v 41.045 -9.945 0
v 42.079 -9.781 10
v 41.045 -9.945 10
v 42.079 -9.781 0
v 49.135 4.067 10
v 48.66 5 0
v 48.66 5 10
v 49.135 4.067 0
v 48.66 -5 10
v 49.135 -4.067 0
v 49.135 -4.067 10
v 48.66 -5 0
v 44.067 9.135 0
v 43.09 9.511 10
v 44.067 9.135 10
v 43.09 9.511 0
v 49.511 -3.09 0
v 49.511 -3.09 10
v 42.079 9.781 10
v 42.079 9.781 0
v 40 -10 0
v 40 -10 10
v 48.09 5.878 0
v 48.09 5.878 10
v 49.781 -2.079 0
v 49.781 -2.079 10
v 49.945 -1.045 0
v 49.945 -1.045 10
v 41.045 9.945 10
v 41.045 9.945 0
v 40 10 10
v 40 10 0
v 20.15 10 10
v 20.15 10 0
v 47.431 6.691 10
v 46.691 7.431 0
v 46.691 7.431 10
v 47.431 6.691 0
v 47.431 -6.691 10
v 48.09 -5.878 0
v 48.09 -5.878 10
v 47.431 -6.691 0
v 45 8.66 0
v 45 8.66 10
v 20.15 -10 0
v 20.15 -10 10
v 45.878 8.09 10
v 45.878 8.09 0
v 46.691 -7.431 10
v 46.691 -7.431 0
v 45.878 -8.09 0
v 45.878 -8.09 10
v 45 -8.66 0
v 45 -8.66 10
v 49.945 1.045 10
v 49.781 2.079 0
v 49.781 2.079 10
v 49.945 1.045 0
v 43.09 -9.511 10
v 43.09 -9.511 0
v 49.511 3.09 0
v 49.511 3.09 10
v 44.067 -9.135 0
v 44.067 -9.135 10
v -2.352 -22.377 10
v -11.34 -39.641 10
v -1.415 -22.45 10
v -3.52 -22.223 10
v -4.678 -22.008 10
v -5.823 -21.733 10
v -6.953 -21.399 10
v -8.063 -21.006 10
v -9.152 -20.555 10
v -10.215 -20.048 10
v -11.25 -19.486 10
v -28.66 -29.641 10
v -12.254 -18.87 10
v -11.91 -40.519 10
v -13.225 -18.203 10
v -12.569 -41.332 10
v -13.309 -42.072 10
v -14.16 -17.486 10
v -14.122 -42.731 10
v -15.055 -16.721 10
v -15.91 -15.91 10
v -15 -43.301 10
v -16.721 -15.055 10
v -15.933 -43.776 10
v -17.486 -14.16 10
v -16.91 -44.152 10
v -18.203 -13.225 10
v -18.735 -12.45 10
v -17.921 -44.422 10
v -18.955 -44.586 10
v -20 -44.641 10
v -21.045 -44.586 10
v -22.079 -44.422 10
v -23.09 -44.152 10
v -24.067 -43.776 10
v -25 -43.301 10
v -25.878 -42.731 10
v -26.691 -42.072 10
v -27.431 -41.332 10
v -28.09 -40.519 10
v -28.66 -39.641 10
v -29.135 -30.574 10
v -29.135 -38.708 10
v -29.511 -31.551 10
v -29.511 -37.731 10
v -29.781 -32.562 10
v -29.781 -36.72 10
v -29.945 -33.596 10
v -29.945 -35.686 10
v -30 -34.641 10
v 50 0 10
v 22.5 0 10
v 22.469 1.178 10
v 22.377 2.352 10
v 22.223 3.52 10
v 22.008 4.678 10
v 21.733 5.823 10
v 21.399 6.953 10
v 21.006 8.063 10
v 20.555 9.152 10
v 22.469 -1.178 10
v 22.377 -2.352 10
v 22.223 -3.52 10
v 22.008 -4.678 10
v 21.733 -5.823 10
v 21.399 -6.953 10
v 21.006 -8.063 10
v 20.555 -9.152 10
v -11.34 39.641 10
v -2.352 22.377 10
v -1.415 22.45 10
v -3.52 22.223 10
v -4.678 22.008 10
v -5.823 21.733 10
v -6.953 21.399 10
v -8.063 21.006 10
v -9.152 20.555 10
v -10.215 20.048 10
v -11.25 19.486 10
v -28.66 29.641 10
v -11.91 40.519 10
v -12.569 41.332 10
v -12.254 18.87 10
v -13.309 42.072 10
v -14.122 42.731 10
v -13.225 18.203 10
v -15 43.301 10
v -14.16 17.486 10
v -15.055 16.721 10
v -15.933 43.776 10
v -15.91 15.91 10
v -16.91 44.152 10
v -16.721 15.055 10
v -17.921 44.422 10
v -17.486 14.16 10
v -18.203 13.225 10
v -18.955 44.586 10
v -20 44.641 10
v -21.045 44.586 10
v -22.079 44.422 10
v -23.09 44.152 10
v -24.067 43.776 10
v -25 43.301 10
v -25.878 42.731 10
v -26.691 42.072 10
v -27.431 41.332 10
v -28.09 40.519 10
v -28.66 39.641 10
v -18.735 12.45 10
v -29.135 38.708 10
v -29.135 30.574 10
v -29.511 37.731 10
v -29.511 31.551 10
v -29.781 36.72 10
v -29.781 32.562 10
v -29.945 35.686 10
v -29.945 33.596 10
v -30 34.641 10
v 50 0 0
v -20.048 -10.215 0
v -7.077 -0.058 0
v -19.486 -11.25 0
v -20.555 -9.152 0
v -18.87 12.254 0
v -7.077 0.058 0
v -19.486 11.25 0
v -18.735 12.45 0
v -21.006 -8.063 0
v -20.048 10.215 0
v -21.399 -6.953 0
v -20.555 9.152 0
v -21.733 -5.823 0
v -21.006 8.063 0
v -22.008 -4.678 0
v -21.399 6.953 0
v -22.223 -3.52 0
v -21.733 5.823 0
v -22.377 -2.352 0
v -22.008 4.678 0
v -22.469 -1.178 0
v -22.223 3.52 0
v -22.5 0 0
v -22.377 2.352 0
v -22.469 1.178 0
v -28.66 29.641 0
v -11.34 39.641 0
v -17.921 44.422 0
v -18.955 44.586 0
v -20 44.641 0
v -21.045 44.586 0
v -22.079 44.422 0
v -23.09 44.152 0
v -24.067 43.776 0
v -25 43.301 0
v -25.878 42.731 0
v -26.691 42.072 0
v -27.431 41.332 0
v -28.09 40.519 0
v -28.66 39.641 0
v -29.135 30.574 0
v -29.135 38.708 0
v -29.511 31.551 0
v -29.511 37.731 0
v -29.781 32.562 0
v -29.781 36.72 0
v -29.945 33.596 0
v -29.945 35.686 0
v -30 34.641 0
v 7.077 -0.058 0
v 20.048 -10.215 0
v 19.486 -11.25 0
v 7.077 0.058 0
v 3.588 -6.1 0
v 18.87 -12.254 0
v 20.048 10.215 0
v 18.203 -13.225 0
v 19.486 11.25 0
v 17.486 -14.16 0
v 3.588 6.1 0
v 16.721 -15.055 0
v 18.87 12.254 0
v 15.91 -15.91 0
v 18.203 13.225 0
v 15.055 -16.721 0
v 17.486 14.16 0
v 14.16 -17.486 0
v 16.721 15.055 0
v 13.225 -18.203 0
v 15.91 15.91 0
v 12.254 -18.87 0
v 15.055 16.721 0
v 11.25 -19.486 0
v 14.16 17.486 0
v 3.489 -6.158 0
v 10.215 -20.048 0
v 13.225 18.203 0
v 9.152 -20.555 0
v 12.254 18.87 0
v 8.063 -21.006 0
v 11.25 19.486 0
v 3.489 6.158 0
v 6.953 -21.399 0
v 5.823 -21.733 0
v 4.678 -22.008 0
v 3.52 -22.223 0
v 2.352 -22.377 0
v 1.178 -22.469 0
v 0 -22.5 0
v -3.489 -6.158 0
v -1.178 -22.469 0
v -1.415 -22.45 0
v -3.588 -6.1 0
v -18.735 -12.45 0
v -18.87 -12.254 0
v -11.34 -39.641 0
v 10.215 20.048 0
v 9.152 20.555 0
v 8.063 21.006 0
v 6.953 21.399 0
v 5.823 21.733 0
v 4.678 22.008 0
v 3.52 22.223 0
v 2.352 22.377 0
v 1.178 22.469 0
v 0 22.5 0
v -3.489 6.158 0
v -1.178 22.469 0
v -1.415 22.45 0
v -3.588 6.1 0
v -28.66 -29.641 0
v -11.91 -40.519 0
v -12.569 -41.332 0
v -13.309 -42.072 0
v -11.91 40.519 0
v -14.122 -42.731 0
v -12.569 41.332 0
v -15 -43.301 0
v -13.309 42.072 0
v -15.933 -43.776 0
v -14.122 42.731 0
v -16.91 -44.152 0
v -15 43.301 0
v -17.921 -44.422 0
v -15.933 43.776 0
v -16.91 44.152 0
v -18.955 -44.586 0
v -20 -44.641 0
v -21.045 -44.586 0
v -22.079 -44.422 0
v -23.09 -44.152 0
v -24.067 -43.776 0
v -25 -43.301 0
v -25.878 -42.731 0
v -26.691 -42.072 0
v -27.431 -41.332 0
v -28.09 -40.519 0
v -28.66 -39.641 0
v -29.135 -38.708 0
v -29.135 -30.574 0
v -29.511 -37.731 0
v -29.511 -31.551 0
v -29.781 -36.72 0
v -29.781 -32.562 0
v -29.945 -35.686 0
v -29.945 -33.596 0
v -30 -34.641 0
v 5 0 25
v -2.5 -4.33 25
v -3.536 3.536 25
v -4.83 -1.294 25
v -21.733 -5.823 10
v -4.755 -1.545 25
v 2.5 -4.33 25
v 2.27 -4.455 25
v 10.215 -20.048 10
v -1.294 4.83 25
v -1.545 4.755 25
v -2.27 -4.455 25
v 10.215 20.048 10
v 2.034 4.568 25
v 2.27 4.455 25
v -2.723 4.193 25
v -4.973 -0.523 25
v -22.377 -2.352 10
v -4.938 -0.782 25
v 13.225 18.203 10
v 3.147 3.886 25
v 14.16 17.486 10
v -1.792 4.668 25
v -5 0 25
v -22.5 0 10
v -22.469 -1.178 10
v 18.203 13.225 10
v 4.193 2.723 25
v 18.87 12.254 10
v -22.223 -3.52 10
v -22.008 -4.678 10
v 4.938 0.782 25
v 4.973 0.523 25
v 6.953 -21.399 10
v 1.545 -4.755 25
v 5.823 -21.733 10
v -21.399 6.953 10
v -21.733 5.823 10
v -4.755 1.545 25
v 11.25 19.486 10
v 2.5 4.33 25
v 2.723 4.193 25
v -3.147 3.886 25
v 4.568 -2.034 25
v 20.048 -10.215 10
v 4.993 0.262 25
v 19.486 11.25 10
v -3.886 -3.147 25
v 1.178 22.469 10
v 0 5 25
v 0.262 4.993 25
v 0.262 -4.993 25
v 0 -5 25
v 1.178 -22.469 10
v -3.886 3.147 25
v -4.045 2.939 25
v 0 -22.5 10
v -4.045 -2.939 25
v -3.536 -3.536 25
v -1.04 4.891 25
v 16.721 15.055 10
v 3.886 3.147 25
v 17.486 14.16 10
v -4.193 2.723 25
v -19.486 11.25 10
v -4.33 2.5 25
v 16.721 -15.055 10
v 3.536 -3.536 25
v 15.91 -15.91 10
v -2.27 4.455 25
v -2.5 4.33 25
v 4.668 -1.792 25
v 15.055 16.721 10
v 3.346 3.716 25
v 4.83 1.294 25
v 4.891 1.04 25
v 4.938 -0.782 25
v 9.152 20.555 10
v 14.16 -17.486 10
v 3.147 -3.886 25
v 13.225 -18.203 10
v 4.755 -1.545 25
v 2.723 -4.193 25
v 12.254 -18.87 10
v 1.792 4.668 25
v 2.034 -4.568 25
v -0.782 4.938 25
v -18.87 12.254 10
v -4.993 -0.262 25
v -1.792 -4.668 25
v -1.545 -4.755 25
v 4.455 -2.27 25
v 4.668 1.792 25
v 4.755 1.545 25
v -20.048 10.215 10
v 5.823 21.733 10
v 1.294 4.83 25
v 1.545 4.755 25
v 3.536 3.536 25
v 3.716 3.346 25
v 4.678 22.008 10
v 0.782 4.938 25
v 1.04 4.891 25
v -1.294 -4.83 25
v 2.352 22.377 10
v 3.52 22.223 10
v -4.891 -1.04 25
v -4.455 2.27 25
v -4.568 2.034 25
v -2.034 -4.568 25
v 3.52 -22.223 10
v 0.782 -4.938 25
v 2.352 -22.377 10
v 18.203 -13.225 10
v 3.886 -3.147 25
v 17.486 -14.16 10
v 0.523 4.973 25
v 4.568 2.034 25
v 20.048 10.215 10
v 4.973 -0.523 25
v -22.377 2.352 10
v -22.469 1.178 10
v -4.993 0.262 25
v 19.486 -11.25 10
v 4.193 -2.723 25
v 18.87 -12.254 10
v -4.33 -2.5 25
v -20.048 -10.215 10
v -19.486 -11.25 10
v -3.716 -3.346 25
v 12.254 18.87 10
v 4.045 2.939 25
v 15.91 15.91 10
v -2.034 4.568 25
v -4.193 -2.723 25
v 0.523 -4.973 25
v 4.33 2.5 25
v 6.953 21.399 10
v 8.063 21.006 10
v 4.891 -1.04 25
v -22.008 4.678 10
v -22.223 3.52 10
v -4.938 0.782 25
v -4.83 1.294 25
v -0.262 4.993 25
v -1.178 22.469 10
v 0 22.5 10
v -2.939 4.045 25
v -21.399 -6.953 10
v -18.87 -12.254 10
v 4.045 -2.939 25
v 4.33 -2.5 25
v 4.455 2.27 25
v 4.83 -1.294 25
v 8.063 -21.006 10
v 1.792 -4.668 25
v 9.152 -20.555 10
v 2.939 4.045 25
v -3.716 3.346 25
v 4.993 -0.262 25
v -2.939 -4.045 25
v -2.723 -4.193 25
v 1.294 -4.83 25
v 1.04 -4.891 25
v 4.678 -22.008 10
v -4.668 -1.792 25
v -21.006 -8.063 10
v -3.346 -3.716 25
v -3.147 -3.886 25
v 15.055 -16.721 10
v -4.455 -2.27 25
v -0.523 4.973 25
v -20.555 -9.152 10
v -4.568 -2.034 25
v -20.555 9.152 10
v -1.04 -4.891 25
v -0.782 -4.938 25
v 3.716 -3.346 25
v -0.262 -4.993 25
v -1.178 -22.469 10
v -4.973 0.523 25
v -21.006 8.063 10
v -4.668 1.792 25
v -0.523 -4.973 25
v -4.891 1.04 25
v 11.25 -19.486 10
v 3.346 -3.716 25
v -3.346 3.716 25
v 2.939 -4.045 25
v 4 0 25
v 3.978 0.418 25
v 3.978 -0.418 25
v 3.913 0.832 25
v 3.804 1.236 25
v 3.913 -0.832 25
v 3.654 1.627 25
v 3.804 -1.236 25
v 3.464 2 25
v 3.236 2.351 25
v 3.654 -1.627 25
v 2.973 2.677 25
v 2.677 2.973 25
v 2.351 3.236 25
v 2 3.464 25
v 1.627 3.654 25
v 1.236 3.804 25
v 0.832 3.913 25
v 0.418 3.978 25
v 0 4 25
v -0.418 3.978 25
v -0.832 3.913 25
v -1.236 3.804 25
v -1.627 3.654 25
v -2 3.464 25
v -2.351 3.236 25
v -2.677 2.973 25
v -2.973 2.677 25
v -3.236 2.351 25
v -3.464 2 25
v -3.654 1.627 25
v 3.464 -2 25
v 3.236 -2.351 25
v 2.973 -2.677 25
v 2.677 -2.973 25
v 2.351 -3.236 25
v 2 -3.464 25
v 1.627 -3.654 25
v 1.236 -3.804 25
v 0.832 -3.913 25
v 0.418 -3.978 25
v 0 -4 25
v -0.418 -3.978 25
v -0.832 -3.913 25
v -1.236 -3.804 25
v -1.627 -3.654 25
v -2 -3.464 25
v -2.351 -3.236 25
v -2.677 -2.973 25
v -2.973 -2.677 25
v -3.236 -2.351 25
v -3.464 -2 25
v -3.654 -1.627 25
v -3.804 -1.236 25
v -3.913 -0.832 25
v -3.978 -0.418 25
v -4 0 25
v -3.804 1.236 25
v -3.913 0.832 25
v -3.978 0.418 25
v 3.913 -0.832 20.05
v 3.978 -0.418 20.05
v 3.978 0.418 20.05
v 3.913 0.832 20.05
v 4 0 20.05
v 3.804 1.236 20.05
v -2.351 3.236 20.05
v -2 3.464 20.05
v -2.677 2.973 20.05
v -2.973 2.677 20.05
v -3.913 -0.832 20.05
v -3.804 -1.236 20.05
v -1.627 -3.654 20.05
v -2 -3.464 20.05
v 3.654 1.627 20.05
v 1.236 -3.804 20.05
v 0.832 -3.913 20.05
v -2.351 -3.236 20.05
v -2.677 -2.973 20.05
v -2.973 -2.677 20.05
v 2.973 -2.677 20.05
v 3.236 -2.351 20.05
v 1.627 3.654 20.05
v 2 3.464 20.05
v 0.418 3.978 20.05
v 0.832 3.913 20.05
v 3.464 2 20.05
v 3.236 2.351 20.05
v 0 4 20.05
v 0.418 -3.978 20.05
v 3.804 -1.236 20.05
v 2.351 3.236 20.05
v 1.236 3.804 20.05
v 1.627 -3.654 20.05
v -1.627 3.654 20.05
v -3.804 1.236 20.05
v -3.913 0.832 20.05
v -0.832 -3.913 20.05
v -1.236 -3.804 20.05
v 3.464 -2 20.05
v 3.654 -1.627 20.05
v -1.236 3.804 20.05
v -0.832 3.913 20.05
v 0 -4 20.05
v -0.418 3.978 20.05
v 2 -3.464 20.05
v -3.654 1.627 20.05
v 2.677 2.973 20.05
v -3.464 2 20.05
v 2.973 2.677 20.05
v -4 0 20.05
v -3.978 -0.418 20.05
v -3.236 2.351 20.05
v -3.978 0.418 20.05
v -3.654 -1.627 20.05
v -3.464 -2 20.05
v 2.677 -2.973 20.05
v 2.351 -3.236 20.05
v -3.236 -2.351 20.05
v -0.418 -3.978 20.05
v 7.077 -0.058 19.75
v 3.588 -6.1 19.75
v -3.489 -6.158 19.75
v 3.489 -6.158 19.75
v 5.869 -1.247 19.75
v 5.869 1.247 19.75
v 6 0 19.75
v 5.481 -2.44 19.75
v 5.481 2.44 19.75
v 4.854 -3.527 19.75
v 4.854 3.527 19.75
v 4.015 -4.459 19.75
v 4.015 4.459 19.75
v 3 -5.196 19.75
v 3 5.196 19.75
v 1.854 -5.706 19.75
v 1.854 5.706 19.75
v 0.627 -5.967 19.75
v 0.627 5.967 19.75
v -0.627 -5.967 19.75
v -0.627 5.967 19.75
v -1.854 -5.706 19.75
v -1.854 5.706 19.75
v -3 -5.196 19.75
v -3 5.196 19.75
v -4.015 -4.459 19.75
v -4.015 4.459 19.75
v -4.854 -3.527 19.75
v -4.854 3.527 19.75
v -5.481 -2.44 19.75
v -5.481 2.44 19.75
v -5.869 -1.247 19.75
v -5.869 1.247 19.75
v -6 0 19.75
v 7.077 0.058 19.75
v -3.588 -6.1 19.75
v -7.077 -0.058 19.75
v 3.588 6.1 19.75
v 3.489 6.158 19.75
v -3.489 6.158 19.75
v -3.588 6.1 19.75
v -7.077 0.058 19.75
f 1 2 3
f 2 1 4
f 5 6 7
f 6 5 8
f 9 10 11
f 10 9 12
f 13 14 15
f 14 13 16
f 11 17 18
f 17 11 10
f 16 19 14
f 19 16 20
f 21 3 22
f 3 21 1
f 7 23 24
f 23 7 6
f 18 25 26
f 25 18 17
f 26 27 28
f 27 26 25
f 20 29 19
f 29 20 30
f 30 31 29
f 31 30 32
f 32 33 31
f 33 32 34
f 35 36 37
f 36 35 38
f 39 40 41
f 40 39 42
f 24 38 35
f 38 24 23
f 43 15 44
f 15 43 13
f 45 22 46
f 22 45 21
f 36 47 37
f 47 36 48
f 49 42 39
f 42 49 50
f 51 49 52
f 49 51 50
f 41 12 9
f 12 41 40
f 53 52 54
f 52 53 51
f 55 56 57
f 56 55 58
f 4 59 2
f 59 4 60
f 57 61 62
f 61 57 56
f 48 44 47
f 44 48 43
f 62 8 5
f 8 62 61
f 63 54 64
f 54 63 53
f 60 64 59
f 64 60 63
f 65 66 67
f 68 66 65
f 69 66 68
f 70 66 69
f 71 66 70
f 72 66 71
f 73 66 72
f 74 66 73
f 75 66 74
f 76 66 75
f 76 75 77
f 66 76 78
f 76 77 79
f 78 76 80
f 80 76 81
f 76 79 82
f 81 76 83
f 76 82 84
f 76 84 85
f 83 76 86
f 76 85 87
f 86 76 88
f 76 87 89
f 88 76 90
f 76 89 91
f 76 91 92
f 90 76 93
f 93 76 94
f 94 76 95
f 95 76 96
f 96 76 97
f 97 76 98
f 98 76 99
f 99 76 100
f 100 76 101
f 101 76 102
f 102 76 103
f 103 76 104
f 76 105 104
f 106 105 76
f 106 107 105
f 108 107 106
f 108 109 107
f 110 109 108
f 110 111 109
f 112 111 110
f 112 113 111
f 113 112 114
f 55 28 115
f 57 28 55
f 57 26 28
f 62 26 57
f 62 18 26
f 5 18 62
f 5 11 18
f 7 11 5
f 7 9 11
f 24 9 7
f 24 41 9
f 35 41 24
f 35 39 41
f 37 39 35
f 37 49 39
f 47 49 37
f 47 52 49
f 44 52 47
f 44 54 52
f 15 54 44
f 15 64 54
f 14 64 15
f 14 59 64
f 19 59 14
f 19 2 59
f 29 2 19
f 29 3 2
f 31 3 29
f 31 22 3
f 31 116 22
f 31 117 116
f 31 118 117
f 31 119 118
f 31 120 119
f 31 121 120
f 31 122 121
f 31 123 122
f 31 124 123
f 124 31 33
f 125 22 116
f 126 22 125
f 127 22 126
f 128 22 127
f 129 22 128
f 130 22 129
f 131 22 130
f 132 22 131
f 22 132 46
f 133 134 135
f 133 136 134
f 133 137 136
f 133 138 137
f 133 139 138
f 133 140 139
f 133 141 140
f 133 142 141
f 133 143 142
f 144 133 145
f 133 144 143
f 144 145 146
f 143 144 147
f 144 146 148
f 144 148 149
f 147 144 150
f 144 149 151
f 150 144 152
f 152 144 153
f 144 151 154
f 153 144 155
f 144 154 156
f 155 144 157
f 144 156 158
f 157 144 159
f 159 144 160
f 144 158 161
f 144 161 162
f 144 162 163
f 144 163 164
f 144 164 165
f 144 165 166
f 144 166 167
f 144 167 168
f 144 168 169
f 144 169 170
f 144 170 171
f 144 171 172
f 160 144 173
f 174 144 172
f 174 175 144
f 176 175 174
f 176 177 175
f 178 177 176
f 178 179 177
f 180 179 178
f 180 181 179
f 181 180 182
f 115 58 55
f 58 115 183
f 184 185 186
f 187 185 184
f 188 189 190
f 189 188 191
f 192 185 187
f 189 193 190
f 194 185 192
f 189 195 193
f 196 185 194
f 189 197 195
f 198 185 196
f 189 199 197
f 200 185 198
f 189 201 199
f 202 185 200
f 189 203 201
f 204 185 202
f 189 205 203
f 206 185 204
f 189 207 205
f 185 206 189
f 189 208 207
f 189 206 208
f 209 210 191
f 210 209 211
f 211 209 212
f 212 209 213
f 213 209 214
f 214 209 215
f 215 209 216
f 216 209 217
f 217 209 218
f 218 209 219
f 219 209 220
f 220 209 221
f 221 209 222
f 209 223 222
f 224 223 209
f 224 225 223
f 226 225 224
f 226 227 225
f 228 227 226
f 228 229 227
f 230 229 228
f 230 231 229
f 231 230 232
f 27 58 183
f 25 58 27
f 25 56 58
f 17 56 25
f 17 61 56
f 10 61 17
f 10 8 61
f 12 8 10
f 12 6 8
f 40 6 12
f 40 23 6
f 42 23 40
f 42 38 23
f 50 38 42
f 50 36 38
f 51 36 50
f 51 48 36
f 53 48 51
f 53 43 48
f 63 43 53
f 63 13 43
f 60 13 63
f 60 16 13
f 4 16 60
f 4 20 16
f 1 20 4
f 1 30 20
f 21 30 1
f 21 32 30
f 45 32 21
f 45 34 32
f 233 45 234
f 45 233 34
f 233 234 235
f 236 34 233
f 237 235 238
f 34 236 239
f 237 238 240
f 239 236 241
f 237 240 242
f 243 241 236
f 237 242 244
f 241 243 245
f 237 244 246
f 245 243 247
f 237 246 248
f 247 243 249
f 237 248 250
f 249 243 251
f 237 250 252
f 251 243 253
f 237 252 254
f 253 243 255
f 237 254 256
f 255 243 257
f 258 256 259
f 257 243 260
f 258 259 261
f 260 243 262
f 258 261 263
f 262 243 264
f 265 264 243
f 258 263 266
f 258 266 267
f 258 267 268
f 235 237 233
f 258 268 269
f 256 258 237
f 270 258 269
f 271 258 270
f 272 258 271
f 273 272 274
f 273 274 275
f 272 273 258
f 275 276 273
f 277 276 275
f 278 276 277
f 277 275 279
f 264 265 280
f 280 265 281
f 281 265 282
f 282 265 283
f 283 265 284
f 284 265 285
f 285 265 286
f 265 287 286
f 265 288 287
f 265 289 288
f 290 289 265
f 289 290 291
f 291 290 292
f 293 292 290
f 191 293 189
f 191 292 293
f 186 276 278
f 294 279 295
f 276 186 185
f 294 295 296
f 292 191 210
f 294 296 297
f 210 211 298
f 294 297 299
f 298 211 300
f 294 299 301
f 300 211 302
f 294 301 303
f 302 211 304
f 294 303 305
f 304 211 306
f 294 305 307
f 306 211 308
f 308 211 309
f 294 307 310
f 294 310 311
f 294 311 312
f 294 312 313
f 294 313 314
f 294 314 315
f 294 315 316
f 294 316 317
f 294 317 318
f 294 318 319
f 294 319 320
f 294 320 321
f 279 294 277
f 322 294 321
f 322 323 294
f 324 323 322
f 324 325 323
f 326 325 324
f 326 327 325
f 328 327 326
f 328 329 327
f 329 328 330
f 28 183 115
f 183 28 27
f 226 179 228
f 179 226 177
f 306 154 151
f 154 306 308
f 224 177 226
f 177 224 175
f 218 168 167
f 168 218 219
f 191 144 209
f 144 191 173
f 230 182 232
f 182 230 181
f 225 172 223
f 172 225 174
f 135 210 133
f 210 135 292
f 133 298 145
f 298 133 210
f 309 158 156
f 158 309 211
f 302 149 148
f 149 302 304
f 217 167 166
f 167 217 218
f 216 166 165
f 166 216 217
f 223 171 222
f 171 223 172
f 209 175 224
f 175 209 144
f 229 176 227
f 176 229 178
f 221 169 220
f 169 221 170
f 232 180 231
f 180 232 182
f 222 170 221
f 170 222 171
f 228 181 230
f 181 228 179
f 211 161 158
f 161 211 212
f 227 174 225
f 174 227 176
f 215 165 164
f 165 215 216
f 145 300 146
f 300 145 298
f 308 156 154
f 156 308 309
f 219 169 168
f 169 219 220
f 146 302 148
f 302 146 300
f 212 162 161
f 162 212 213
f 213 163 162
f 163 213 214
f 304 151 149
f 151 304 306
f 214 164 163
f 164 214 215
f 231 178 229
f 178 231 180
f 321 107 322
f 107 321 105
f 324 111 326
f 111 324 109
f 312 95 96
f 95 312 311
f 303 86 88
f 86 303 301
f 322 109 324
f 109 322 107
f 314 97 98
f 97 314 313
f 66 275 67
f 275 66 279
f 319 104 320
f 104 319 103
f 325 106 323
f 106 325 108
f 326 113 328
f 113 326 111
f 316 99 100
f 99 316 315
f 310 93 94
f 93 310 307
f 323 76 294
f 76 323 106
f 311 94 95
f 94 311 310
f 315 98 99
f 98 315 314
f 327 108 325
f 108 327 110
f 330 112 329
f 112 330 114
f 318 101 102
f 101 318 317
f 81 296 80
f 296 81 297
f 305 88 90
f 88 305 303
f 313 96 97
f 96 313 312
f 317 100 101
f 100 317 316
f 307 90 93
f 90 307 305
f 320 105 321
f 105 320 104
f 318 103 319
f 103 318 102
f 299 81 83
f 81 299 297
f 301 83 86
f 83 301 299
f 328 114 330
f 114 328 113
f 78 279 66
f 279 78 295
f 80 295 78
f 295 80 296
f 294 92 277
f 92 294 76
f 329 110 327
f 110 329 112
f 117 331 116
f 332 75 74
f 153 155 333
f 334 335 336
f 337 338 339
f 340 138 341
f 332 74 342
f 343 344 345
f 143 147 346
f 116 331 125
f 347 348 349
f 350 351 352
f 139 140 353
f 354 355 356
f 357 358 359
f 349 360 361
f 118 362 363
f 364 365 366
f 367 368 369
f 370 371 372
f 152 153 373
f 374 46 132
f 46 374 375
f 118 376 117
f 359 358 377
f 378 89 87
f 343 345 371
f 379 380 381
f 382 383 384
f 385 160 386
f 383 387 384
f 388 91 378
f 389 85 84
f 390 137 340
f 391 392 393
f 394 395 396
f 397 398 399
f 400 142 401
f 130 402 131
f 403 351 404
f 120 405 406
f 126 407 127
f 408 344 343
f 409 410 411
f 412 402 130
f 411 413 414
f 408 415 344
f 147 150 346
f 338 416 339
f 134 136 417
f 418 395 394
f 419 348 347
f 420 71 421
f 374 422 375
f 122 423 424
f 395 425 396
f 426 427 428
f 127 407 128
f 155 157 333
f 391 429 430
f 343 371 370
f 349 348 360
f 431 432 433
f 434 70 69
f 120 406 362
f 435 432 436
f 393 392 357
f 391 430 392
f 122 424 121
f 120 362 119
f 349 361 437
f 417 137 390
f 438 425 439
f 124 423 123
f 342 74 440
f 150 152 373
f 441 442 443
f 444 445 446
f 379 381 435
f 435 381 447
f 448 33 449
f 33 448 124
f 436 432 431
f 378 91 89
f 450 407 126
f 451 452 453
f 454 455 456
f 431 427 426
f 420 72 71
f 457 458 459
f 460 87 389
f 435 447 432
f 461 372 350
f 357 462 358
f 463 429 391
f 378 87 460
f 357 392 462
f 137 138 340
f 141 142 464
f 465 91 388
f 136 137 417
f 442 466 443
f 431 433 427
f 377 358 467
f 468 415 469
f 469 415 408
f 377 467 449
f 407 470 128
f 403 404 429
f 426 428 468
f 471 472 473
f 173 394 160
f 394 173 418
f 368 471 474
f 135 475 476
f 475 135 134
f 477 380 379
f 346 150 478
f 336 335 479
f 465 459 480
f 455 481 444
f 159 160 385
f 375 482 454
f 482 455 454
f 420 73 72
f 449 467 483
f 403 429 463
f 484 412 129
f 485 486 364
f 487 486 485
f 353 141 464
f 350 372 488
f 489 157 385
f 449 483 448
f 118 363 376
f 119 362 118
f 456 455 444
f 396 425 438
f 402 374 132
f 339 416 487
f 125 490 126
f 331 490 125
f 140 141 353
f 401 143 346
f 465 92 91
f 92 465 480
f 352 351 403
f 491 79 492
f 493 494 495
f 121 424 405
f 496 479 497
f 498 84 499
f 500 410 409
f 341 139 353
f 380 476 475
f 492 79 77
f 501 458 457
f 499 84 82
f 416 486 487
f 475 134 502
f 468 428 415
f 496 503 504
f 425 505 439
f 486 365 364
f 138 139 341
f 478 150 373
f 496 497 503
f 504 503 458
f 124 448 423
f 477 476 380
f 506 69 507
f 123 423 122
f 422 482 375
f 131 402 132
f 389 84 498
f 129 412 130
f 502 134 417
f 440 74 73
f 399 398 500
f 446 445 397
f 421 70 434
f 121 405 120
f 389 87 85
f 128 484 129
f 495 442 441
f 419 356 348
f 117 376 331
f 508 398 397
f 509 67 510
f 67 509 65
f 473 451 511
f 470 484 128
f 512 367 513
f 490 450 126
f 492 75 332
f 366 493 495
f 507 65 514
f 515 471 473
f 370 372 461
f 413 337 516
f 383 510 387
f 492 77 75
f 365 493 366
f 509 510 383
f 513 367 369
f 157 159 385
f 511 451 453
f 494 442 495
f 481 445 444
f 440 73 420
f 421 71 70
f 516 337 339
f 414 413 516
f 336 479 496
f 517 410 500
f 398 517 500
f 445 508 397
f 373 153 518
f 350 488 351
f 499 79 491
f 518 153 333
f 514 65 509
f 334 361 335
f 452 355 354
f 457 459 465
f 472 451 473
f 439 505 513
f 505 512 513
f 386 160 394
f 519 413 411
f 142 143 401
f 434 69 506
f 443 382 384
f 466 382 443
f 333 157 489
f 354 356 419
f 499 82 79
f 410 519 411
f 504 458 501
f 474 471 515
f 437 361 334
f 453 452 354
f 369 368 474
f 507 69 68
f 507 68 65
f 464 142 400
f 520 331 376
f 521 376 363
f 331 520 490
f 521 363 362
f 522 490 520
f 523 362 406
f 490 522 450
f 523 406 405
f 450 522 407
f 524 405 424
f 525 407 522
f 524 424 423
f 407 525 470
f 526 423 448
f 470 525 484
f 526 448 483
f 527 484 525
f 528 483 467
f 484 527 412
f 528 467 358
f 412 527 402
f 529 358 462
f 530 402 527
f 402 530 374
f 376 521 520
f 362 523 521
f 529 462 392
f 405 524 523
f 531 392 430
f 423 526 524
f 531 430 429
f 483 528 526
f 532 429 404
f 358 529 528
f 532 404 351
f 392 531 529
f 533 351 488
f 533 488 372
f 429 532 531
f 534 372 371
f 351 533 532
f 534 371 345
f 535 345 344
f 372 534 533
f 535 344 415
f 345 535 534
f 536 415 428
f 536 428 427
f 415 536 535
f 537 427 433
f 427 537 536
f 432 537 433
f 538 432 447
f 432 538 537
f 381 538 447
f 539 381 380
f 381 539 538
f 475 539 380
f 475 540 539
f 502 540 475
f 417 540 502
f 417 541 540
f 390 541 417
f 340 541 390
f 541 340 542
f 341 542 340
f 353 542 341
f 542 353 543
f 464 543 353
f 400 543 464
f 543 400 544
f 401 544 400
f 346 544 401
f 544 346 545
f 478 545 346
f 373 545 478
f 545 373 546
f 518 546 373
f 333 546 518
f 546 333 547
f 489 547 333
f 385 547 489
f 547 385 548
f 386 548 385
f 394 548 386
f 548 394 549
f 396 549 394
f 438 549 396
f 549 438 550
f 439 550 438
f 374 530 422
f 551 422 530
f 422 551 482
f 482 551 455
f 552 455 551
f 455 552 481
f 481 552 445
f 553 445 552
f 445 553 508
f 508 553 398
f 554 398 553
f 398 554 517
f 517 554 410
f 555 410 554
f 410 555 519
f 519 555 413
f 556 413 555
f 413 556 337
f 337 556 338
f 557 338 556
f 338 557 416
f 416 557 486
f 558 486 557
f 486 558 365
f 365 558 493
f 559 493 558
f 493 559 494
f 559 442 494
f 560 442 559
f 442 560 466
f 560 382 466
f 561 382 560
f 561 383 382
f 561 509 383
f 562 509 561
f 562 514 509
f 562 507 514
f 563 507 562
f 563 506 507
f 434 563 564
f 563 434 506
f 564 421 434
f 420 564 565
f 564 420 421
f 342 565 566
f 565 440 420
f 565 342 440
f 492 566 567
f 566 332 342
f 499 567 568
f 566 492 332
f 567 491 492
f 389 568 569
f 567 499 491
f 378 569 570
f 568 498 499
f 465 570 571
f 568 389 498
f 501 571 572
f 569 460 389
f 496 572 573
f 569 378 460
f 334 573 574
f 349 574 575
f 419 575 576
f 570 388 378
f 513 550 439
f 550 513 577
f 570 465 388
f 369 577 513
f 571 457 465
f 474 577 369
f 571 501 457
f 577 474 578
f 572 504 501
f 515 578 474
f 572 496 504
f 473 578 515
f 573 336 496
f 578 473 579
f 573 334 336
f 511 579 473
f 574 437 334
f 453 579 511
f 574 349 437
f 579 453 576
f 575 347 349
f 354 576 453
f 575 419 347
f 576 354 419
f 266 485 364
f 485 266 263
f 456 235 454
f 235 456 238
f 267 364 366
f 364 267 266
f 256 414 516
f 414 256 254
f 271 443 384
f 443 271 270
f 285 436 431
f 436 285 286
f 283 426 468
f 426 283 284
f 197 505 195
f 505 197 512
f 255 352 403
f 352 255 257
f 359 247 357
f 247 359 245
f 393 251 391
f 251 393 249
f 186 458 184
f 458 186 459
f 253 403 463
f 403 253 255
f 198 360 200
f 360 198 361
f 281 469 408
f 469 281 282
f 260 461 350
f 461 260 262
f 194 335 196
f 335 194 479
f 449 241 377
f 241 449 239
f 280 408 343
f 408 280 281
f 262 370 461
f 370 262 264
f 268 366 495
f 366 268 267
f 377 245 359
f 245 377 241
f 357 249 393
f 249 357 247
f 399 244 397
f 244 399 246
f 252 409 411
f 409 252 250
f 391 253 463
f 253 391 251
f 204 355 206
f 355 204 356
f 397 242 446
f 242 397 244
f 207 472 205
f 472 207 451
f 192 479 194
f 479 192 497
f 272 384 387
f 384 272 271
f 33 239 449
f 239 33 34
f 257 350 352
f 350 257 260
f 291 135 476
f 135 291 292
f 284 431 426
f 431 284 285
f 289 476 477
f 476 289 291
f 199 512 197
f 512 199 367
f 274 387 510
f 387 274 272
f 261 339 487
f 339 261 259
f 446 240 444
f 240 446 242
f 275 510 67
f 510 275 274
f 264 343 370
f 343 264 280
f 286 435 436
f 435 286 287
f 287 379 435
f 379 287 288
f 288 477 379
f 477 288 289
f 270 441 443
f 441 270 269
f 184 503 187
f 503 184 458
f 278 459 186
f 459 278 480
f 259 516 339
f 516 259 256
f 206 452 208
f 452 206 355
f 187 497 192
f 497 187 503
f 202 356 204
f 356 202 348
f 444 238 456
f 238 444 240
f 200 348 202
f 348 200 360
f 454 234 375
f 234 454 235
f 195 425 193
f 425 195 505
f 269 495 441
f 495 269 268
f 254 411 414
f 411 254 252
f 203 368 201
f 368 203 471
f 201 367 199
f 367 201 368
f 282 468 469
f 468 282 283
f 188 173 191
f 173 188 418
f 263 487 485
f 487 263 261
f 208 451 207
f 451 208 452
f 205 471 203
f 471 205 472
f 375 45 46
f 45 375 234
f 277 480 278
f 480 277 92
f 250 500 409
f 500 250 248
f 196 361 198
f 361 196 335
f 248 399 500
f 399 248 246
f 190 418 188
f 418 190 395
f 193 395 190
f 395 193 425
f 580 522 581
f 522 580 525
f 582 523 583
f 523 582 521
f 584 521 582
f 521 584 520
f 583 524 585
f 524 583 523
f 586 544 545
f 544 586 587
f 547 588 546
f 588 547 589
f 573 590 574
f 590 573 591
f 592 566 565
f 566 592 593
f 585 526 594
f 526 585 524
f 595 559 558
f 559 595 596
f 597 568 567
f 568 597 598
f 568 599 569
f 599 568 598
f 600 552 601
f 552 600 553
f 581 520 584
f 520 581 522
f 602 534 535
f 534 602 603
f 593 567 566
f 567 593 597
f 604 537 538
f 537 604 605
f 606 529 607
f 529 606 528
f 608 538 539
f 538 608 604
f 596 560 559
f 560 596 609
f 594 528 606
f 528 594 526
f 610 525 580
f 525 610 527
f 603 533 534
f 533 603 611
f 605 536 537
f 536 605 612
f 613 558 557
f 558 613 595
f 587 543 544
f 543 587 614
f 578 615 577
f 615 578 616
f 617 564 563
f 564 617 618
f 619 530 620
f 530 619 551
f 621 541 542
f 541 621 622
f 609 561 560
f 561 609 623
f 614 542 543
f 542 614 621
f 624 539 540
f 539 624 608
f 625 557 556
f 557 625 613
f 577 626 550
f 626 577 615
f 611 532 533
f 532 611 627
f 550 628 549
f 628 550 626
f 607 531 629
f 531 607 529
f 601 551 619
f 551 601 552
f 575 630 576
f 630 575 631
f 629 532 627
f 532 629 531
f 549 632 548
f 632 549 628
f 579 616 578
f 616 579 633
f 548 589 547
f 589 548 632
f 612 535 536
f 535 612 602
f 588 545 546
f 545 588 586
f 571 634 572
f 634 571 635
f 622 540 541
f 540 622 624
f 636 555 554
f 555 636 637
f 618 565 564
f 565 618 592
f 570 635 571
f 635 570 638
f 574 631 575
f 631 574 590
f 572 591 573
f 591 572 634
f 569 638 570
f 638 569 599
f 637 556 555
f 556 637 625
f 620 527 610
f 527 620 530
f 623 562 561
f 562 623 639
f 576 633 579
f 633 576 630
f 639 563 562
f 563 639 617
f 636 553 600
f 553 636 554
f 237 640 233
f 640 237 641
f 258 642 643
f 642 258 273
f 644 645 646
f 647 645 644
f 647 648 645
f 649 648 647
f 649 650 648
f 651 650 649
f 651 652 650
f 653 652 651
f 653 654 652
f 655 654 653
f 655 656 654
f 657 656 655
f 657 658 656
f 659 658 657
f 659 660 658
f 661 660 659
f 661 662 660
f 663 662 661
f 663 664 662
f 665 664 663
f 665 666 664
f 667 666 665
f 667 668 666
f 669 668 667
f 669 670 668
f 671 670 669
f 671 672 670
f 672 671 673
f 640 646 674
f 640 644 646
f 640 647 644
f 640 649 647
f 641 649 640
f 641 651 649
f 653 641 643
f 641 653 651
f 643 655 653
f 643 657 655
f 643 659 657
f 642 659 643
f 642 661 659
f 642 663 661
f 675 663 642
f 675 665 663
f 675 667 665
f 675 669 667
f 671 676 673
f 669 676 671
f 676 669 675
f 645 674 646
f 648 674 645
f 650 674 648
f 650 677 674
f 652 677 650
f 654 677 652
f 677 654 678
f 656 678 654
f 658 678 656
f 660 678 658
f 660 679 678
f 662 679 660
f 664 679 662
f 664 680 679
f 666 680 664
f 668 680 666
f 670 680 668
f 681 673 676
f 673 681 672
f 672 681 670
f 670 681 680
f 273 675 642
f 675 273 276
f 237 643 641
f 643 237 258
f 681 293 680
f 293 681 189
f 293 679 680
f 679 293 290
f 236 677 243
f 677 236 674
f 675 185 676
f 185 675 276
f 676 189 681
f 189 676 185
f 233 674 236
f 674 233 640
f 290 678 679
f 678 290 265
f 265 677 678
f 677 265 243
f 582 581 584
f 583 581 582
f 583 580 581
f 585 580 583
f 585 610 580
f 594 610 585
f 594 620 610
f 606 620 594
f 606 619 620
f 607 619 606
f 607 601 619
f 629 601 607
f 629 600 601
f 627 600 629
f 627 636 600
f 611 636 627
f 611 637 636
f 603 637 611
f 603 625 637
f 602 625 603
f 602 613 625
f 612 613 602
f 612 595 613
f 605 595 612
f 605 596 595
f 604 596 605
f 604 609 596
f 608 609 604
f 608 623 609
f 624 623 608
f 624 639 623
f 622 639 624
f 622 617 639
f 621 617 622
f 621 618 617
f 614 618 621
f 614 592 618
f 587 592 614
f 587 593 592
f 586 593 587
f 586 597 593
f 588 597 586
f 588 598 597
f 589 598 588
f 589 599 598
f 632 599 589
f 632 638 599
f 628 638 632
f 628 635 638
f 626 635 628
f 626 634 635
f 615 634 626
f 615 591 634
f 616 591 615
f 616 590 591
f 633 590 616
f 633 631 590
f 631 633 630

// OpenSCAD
// file: slot_fill.scad
module slot_fill(length = 20) {
  difference() {
    translate([0, 0, 0]) rotate([0, 0, 0]) cylinder(r=4.5, h=length, center=true,  $fn=4);	
    //plane sides
	translate([-3.8, 0, 0]) rotate([0, 0, 0]) cube([4, 20, length*2], center=true);
	translate([3, 0, 0]) rotate([0, 0, 0]) cube([6, 20, length*2], center=true);
  }
}
// main file
include <MCAD/shapes.scad>
include <slot_fill.scad>


module fhex(wid,height){
  hull(){
    cube([wid/1.7,wid,height],center=true);
    rotate([0,0,120]) cube([wid/1.7,wid,height], center=true);
    rotate([0,0,240]) cube([wid/1.7,wid,height], center=true);
  }
}

module bearing(dia=22,hole=8,thinkness=7){
  color("silver")
  difference(){
    cylinder(d=dia, h=thinkness, $fn=60, center=true);
    cylinder(d=hole, h=thinkness+0.2, $fn=60, center=true);
  }
}

module refill3d_spool(){
  color("white")
  difference(){
    union(){
      translate([0,0,-45]) cylinder(d=160, h=3.0, $fn=360, center=true);
      translate([0,0,0]) cylinder(d=50, h=90, $fn=360, center=true);
      translate([0,0,45]) cylinder(d=160, h=3.0, $fn=360, center=true);
    }
    translate([0,0,0]) cylinder(d=32, h=93.2, $fn=360, center=true);
  }
}

module filament_spool(){
  color("black")
  difference(){
    union(){
      translate([0,0,-30]) cylinder(d=205, h=3.85, $fn=360, center=true);
      translate([0,0,0]) cylinder(d=90, h=64, $fn=360, center=true);
      translate([0,0,30]) cylinder(d=205, h=3.85, $fn=360, center=true);
    }
    translate([0,0,0]) cylinder(d=54, h=64.2, $fn=360, center=true);
  }
}

module spool_holder(printable=false, version=1){
  difference(){
    union(){
      translate([0,0,3]) cylinder(d=125, h=6, $fn=360, center=true);
      translate([0,0,10]) cylinder(d=25, h=20, $fn=90, center=true);
        
      intersection(){
        translate([0,0,12.5]) cylinder(d=30, h=15, $fn=90, center=true);
        translate([0,0,12.5]) cube([15,40,15], center=true);
      }
      intersection(){
        translate([0,0,12.5]) cylinder(d=30, h=15, $fn=90, center=true);
        translate([0,0,12.5]) cube([40,15,15], center=true);
      }
    }
    
    
    translate([0,0,85]) cylinder(d=9, h=180, $fn=90, center=true);
    translate([0,0,3]) cylinder(d=22.6, h=8, $fn=90, center=true);
    translate([0,0,5]) cylinder(d=15, h=18, $fn=90, center=true);
    translate([0,0,17]) cylinder(d=22.6, h=8, $fn=90, center=true);
//    translate([0,0,15]) cylinder(d=20, h=8, $fn=90, center=true);
    
    translate([0,0,4]) 
    difference(){
      cylinder(d=110, h=10, $fn=90, center=true);
      cylinder(d=40, h=10.02, $fn=90, center=true);
    
      cube([115,10,10.02], center=true);
      cube([10,115,10.02], center=true);
    }
    if(version==2){
      difference(){
        translate([0,0,3]) cylinder(d=126, h=12, $fn=90, center=true);
        translate([0,0,3]) cylinder(d=40.1, h=14, $fn=90, center=true);
      }
    }
  }
  
  if(printable){
    translate([0,0,7.15]) cylinder(d=23, h=0.3, $fn=30, center=true);
//    translate([0,0,9.15]) cylinder(d=12, h=0.3, $fn=30, center=true);
  }
}


module spool_arm(){
  difference(){
    union(){
      translate([0,0,8.5]) cylinder(d=20, h=16, $fn=60, center=true);
      hull(){
        for(X=[-10,10], Y=[-10,10], Z=[2,12]){
          translate([X,Y,Z]) sphere(d=4, $fn=30, center=true);
        }
        for(X=[5,-5], Y=[120], Z=[2,8]){
           translate([X,Y,Z]) sphere(d=4, $fn=30, center=true);
        }
      }
      hull(){
        translate([0,115,70]) sphere(d=12,center=true);
        translate([0,115,4]) cylinder(d=12, h=1, $fn=60, center=true);
      }
    }
    translate([0,0,1.5]) cylinder(d=8.01, h=4.2, $fn=60, center=true);
    translate([0,123,65]) rotate([90,0,0]) cylinder(d1=20, d2=13, h=10, $fn=60, center=true);
    translate([0,115,65]) rotate([90,0,0]) cylinder(d=5.5, h=20, $fn=60, center=true);
    translate([0,0,13.5]) fhex(13.2,20);
  }
}

module spool_assembly_holders(offset=30){
  translate([0,0,0]) rotate([0,90,0]) bearing();
  translate([3,0,0]) rotate([0,90,180]) spool_holder();
  translate([-14,0,0]) rotate([0,90,0]) bearing();
}

module coupler(){
  //11.82x29.48
  difference(){
    fhex(12,29.5);
    cylinder(d=7,h=30, $fn=60, center=true);
  }
}

module spool_nut(printable=false){
//  translate([0,0,5]) coupler();
  difference(){
    union(){
      translate([0,0,17.5]) cylinder(d1=45, d2=10, h=15, $fn=120, center=true);
      translate([0,0,5]) cylinder(d=45,h=10, $fn=120, center=true);
      for(R=[0,120, 240]){
        hull(){
          translate([0,0,5]) cylinder(d=20,h=10, $fn=60, center=true);
          rotate([0,0,R]) translate([40,0,5]) cylinder(d=20,h=10, $fn=60, center=true);
        }
      }
    }
    translate([0,0,14]) cylinder(d=8,h=30,$fn=60,center=true);
    translate([0,0,5]) fhex(12.2,29.5);
  }
  if(printable){
    translate([0,0,19.9]) cylinder(d=12, h=0.3, $fn=30, center=true);
  }
}

module standard_spool(fudge=1,printable=true){
  difference(){
    union(){
      translate([0,0,2]) cylinder(d=60, h=4, $fn=90, center=true);
      translate([0,0,14]) cylinder(d=56, h=20, $fn=90, center=true);
    }
    translate([0,0,0]) cylinder(d=40+fudge, h=14, $fn=90, center=true);
    union(){
      intersection(){
        translate([0,0,12.5+fudge]) cylinder(d=30+fudge, h=15, $fn=90, center=true);
        translate([0,0,12.5+fudge]) cube([15,40,15], center=true);
      }
      intersection(){
        translate([0,0,12.5+fudge]) cylinder(d=30+fudge, h=15, $fn=90, center=true);
        translate([0,0,12.5+fudge]) cube([40,15,15], center=true);
      }
      translate([0,0,11]) cylinder(d=25+fudge, h=20, $fn=90, center=true);
    }
    translate([0,0,25]) cylinder(d=22, h=10, $fn=90, center=true);
  }
  if(printable){
    translate([0,0,7.15]) cylinder(d=40, h=0.3, $fn=30, center=true);
    translate([0,0,21.15]) cylinder(d=23, h=0.3, $fn=30, center=true);
  }
}

module spool_assembly(type=1){
  translate([-80,0,0]) rotate([0,90,0]) color("silver") cylinder(d=8, h=160, $fn=60, center=true);
  
  translate([-5,0,0]) rotate([0,90,0]) color("silver") fhex(13,7);
  translate([-12.5,0,0]) rotate([0,270,0]) spool_arm();
  translate([-20.1,0,0]) rotate([0,90,0]) color("silver") fhex(13,7);
  translate([-27.2,0,0]) rotate([0,90,0]) color("silver") fhex(13,7);
  
  translate([-35,0,0]) 
  if(type == 1){
    spool_assembly_holders();
    translate([-37,0,0]) rotate([0,90,180]) filament_spool();
    translate([-73,0,0]) rotate([0,0,180]) spool_assembly_holders();
    translate([-102,0,0]) rotate([0,90,0]) spool_nut();
  }
  else if(type == 2){
    spool_assembly_holders();
    translate([-50,0,0]) rotate([0,90,180]) refill3d_spool();
    translate([-100,0,0]) rotate([0,0,180]) spool_assembly_holders();
    translate([-130,0,0]) rotate([0,90,0]) spool_nut();
  }
}

spool_nut(printable=true);
//spool_assembly(type=2);
//spool_arm();
//spool_nut();
//spool_holder(printable=false,version=2);
//standard_spool();
//spool_assembly_holders();
